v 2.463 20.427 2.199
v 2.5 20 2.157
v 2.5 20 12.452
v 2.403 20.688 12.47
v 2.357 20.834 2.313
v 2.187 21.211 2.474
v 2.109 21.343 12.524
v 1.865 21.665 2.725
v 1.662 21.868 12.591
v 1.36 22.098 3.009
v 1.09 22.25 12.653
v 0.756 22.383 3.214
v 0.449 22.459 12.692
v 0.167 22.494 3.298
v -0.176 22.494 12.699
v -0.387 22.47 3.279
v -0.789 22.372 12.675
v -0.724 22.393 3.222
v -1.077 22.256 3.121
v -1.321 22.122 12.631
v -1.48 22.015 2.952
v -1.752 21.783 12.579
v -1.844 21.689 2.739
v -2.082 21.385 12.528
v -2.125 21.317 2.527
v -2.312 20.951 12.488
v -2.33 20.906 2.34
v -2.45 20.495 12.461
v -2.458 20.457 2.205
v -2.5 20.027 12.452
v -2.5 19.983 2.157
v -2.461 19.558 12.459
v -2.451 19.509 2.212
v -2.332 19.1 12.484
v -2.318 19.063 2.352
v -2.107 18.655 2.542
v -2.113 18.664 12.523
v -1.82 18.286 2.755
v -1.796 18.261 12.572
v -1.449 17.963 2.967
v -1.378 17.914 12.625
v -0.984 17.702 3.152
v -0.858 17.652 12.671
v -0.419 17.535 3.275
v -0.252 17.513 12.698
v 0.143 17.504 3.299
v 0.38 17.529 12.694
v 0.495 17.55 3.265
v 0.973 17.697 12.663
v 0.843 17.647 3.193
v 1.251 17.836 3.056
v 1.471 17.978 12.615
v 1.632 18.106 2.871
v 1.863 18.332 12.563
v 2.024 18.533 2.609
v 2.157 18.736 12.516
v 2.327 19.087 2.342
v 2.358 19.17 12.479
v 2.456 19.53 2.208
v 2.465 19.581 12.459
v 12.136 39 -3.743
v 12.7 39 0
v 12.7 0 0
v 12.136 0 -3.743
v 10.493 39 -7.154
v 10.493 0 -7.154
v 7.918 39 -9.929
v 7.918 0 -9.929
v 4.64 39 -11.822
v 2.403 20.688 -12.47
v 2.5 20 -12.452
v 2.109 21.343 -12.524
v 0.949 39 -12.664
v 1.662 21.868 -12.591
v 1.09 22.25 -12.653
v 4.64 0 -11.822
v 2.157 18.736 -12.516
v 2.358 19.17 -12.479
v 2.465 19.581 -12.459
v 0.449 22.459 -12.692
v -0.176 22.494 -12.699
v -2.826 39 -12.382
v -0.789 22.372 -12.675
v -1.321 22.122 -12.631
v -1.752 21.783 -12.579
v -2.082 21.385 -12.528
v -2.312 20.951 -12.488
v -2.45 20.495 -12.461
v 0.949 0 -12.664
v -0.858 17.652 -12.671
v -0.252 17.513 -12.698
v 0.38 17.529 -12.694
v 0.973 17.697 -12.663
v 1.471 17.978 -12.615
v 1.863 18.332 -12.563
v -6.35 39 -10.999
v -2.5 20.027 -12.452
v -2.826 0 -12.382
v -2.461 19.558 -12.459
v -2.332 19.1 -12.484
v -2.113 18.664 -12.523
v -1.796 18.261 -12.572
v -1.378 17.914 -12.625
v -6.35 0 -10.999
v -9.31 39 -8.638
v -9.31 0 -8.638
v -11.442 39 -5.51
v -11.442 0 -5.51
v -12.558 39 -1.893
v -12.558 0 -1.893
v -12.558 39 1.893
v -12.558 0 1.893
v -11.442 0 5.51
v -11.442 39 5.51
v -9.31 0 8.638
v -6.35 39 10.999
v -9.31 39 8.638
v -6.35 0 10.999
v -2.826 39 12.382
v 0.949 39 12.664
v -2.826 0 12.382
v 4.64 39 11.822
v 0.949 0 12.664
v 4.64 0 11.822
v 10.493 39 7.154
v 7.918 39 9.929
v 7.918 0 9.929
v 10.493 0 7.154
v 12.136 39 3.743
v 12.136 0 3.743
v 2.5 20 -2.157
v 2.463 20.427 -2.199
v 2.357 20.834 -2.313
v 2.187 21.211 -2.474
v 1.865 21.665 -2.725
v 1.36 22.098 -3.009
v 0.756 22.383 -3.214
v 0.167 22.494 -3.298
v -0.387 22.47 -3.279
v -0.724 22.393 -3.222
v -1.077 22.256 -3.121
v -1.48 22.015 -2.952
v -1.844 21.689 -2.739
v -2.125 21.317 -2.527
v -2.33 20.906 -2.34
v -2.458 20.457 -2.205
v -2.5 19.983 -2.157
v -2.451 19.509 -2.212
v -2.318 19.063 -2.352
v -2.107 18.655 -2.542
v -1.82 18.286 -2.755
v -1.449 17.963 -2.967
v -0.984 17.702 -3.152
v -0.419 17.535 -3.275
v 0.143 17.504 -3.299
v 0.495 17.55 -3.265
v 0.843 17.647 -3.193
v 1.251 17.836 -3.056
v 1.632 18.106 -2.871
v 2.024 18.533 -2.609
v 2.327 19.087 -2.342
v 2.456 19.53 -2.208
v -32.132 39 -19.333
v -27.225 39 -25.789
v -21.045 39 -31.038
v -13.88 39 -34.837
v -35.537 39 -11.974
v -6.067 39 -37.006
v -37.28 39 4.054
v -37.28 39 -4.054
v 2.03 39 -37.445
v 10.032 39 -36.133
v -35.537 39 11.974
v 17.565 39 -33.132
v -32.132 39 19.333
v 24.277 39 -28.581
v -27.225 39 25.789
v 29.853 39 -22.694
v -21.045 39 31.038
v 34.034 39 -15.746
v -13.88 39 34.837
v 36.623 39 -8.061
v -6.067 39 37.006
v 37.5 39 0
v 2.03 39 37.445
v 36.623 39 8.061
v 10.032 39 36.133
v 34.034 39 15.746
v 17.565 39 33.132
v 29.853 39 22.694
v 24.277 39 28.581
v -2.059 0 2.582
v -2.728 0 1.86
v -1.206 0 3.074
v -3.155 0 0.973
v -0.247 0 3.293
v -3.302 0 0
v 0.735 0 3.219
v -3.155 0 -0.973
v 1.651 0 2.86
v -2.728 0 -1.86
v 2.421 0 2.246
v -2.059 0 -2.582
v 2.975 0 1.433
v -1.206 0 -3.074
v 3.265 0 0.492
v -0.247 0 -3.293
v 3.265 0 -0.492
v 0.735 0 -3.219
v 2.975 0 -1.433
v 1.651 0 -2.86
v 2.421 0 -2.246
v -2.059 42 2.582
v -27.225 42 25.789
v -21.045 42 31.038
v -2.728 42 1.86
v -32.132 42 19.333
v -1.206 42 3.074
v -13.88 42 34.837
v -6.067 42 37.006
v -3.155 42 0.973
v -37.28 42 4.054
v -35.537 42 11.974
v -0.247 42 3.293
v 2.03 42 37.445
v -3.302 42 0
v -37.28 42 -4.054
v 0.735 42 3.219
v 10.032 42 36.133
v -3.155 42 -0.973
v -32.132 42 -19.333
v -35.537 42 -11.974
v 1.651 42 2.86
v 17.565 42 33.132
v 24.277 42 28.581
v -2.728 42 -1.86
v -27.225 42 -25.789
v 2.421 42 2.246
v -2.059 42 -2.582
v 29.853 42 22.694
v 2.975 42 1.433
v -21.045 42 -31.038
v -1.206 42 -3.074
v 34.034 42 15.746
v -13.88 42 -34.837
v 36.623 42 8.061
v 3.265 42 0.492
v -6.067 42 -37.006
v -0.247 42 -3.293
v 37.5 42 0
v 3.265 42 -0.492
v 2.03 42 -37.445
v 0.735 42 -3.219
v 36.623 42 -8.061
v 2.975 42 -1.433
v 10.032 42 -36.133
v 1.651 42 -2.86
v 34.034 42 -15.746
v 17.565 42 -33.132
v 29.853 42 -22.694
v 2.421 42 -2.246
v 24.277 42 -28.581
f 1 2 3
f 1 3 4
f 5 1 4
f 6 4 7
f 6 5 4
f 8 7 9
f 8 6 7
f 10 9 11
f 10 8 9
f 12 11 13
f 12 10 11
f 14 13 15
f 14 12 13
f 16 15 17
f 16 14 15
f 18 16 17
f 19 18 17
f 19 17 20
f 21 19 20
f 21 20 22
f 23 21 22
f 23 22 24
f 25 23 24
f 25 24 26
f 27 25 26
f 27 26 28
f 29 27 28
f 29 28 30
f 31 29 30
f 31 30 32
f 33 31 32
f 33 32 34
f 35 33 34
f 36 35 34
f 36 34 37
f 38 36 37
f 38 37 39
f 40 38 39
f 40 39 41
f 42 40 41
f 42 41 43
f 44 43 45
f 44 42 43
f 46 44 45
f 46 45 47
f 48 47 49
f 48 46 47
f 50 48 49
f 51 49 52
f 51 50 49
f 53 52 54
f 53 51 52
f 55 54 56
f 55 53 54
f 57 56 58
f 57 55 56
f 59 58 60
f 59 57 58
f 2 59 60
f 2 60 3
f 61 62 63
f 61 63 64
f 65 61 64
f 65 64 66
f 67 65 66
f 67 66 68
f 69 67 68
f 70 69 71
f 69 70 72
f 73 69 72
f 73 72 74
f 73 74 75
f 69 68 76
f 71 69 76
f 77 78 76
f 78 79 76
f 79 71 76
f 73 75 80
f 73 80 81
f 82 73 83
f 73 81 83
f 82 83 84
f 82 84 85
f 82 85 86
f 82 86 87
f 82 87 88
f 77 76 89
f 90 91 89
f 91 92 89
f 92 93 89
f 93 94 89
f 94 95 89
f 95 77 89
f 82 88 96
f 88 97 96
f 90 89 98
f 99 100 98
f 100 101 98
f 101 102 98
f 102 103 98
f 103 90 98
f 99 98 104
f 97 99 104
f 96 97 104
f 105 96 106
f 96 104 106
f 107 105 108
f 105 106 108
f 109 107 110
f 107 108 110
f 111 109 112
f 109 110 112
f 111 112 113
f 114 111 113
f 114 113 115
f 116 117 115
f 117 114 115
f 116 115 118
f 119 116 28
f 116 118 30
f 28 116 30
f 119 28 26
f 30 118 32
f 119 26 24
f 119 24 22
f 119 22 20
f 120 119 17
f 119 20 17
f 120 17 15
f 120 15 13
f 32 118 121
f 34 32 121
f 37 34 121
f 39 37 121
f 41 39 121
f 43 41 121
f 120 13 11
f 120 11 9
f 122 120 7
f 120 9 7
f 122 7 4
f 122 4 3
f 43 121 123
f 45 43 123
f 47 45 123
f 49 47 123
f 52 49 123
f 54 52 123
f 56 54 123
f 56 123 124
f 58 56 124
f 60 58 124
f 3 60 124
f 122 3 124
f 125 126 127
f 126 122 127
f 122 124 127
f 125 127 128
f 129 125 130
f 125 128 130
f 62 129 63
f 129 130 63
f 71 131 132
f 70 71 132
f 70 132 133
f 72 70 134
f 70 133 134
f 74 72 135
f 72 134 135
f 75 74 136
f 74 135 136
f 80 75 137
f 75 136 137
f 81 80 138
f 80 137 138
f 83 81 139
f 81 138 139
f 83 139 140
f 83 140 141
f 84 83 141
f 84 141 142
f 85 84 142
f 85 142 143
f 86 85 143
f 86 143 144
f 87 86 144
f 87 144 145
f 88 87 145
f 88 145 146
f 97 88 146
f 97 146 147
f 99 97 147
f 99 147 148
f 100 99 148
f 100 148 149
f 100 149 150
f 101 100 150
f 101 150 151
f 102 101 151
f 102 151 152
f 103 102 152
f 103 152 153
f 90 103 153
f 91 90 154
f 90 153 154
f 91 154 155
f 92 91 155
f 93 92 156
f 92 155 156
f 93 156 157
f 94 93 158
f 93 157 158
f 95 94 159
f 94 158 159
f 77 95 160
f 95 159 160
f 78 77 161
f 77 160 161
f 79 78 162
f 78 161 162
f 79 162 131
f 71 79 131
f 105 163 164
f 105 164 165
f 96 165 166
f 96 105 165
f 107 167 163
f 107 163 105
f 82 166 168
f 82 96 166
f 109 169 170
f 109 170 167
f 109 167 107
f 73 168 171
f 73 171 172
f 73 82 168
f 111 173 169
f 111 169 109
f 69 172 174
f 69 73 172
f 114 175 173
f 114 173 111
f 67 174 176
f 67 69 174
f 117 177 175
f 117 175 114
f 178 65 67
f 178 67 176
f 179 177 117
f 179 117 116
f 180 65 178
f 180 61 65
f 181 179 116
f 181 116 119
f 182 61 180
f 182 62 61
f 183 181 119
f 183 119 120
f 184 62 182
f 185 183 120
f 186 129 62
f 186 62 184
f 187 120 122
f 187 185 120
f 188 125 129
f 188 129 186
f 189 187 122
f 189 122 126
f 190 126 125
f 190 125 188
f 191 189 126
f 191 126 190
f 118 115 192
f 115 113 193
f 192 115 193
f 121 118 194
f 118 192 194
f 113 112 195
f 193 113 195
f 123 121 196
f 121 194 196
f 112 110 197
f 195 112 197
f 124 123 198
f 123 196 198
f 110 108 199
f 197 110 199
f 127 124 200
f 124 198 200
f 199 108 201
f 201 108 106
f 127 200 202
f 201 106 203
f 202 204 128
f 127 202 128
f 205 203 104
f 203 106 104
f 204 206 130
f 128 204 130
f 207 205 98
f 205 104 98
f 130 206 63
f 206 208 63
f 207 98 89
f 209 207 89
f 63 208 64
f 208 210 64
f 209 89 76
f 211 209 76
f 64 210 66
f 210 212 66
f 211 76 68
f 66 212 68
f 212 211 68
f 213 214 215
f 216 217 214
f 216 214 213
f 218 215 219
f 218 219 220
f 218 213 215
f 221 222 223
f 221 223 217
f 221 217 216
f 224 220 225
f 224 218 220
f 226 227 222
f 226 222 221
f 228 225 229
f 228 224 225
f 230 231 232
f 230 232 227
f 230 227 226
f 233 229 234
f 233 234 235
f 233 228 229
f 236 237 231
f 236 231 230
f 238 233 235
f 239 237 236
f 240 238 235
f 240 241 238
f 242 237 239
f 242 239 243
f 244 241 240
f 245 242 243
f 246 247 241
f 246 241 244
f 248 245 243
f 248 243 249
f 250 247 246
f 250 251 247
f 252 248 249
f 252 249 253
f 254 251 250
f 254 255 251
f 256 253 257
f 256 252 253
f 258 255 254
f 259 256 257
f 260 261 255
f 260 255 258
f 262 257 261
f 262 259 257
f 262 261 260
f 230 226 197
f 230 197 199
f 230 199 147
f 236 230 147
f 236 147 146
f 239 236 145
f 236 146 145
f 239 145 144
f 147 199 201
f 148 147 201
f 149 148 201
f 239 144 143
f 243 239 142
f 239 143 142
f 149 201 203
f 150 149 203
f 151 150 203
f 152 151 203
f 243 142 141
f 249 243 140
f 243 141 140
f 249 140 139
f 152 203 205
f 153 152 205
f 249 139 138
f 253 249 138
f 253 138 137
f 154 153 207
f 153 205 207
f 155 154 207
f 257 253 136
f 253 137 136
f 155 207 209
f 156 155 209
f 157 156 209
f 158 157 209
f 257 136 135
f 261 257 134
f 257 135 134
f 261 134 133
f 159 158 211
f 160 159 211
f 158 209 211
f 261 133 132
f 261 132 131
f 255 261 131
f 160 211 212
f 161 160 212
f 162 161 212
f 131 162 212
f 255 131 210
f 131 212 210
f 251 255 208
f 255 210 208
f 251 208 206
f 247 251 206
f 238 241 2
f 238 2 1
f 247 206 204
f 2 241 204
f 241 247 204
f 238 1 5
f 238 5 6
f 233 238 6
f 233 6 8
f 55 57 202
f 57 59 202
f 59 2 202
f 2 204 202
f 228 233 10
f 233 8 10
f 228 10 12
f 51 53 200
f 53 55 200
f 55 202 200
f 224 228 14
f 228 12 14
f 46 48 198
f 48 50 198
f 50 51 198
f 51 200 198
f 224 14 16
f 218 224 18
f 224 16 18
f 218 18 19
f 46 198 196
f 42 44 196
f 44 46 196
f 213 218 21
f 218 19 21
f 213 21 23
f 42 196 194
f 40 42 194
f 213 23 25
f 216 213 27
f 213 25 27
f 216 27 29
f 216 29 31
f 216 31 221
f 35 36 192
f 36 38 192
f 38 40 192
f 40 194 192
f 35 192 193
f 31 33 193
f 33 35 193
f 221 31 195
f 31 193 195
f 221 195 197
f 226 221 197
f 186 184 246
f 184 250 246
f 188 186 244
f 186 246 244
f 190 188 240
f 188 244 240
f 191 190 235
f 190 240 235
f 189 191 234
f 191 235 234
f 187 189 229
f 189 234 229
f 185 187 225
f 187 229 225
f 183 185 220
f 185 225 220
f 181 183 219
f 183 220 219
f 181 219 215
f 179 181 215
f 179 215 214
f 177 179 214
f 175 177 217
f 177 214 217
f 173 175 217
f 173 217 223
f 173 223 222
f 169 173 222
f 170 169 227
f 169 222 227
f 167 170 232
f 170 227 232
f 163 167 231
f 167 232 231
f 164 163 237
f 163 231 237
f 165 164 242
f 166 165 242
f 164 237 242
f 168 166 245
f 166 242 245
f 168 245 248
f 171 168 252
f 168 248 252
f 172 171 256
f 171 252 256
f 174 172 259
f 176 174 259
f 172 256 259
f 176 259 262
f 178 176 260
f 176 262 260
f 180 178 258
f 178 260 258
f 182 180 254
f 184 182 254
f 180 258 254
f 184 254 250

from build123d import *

# Parameters (mm, degrees)
SKETCH1_R               = 12.7
BOSS_EXTRUDE1_DEPTH     = 40
SKETCH2_R               = 37.5
BOSS_EXTRUDE2_DEPTH     = 2
SKETCH3_R               = 3.302
CUT_EXTRUDE1_DEPTH      = 43
SKETCH4_R               = 2.5
CUT_EXTRUDE2_DEPTH      = 38.5
CUT_EXTRUDE2_DEPTH_BACK = 38.5
SKETCH5_R               = 37.5
SKETCH5_R_2             = 12.7
BOSS_EXTRUDE3_DEPTH     = 1


with BuildPart() as part:
    # Sketch1 → Boss-Extrude1 (new body)
    with BuildSketch(Plane(origin=(0, 0, 0), x_dir=(1, 0, 0), z_dir=(0, 1, 0))):
        Circle(SKETCH1_R)
    extrude(amount=BOSS_EXTRUDE1_DEPTH)

    # Sketch2 → Boss-Extrude2 (add)
    with BuildSketch(Plane(origin=(0, 40, 0), x_dir=(1, 0, 0), z_dir=(0, 1, 0))):
        Circle(SKETCH2_R)
    extrude(amount=BOSS_EXTRUDE2_DEPTH)

    # Sketch3 → Cut-Extrude1 (cut, through all)
    with BuildSketch(Plane(origin=(0, 0, 0), x_dir=(-1, 0, 0), z_dir=(0, -1, 0))):
        Circle(SKETCH3_R)
    extrude(amount=-CUT_EXTRUDE1_DEPTH, mode=Mode.SUBTRACT)

    # Sketch4 → Cut-Extrude2 (cut, two sides)
    with BuildSketch(Plane.XY) as cut_extrude2_sk:
        with Locations((0, 20)):
            Circle(SKETCH4_R)
    extrude(amount=CUT_EXTRUDE2_DEPTH, mode=Mode.SUBTRACT)
    extrude(cut_extrude2_sk.sketch, amount=-CUT_EXTRUDE2_DEPTH_BACK, mode=Mode.SUBTRACT)

    # Sketch5 → Boss-Extrude3 (add)
    with BuildSketch(Plane.XZ.offset(-40)):
        Circle(SKETCH5_R)
        Circle(SKETCH5_R_2, mode=Mode.SUBTRACT)
    extrude(amount=BOSS_EXTRUDE3_DEPTH)


solid = part.part
